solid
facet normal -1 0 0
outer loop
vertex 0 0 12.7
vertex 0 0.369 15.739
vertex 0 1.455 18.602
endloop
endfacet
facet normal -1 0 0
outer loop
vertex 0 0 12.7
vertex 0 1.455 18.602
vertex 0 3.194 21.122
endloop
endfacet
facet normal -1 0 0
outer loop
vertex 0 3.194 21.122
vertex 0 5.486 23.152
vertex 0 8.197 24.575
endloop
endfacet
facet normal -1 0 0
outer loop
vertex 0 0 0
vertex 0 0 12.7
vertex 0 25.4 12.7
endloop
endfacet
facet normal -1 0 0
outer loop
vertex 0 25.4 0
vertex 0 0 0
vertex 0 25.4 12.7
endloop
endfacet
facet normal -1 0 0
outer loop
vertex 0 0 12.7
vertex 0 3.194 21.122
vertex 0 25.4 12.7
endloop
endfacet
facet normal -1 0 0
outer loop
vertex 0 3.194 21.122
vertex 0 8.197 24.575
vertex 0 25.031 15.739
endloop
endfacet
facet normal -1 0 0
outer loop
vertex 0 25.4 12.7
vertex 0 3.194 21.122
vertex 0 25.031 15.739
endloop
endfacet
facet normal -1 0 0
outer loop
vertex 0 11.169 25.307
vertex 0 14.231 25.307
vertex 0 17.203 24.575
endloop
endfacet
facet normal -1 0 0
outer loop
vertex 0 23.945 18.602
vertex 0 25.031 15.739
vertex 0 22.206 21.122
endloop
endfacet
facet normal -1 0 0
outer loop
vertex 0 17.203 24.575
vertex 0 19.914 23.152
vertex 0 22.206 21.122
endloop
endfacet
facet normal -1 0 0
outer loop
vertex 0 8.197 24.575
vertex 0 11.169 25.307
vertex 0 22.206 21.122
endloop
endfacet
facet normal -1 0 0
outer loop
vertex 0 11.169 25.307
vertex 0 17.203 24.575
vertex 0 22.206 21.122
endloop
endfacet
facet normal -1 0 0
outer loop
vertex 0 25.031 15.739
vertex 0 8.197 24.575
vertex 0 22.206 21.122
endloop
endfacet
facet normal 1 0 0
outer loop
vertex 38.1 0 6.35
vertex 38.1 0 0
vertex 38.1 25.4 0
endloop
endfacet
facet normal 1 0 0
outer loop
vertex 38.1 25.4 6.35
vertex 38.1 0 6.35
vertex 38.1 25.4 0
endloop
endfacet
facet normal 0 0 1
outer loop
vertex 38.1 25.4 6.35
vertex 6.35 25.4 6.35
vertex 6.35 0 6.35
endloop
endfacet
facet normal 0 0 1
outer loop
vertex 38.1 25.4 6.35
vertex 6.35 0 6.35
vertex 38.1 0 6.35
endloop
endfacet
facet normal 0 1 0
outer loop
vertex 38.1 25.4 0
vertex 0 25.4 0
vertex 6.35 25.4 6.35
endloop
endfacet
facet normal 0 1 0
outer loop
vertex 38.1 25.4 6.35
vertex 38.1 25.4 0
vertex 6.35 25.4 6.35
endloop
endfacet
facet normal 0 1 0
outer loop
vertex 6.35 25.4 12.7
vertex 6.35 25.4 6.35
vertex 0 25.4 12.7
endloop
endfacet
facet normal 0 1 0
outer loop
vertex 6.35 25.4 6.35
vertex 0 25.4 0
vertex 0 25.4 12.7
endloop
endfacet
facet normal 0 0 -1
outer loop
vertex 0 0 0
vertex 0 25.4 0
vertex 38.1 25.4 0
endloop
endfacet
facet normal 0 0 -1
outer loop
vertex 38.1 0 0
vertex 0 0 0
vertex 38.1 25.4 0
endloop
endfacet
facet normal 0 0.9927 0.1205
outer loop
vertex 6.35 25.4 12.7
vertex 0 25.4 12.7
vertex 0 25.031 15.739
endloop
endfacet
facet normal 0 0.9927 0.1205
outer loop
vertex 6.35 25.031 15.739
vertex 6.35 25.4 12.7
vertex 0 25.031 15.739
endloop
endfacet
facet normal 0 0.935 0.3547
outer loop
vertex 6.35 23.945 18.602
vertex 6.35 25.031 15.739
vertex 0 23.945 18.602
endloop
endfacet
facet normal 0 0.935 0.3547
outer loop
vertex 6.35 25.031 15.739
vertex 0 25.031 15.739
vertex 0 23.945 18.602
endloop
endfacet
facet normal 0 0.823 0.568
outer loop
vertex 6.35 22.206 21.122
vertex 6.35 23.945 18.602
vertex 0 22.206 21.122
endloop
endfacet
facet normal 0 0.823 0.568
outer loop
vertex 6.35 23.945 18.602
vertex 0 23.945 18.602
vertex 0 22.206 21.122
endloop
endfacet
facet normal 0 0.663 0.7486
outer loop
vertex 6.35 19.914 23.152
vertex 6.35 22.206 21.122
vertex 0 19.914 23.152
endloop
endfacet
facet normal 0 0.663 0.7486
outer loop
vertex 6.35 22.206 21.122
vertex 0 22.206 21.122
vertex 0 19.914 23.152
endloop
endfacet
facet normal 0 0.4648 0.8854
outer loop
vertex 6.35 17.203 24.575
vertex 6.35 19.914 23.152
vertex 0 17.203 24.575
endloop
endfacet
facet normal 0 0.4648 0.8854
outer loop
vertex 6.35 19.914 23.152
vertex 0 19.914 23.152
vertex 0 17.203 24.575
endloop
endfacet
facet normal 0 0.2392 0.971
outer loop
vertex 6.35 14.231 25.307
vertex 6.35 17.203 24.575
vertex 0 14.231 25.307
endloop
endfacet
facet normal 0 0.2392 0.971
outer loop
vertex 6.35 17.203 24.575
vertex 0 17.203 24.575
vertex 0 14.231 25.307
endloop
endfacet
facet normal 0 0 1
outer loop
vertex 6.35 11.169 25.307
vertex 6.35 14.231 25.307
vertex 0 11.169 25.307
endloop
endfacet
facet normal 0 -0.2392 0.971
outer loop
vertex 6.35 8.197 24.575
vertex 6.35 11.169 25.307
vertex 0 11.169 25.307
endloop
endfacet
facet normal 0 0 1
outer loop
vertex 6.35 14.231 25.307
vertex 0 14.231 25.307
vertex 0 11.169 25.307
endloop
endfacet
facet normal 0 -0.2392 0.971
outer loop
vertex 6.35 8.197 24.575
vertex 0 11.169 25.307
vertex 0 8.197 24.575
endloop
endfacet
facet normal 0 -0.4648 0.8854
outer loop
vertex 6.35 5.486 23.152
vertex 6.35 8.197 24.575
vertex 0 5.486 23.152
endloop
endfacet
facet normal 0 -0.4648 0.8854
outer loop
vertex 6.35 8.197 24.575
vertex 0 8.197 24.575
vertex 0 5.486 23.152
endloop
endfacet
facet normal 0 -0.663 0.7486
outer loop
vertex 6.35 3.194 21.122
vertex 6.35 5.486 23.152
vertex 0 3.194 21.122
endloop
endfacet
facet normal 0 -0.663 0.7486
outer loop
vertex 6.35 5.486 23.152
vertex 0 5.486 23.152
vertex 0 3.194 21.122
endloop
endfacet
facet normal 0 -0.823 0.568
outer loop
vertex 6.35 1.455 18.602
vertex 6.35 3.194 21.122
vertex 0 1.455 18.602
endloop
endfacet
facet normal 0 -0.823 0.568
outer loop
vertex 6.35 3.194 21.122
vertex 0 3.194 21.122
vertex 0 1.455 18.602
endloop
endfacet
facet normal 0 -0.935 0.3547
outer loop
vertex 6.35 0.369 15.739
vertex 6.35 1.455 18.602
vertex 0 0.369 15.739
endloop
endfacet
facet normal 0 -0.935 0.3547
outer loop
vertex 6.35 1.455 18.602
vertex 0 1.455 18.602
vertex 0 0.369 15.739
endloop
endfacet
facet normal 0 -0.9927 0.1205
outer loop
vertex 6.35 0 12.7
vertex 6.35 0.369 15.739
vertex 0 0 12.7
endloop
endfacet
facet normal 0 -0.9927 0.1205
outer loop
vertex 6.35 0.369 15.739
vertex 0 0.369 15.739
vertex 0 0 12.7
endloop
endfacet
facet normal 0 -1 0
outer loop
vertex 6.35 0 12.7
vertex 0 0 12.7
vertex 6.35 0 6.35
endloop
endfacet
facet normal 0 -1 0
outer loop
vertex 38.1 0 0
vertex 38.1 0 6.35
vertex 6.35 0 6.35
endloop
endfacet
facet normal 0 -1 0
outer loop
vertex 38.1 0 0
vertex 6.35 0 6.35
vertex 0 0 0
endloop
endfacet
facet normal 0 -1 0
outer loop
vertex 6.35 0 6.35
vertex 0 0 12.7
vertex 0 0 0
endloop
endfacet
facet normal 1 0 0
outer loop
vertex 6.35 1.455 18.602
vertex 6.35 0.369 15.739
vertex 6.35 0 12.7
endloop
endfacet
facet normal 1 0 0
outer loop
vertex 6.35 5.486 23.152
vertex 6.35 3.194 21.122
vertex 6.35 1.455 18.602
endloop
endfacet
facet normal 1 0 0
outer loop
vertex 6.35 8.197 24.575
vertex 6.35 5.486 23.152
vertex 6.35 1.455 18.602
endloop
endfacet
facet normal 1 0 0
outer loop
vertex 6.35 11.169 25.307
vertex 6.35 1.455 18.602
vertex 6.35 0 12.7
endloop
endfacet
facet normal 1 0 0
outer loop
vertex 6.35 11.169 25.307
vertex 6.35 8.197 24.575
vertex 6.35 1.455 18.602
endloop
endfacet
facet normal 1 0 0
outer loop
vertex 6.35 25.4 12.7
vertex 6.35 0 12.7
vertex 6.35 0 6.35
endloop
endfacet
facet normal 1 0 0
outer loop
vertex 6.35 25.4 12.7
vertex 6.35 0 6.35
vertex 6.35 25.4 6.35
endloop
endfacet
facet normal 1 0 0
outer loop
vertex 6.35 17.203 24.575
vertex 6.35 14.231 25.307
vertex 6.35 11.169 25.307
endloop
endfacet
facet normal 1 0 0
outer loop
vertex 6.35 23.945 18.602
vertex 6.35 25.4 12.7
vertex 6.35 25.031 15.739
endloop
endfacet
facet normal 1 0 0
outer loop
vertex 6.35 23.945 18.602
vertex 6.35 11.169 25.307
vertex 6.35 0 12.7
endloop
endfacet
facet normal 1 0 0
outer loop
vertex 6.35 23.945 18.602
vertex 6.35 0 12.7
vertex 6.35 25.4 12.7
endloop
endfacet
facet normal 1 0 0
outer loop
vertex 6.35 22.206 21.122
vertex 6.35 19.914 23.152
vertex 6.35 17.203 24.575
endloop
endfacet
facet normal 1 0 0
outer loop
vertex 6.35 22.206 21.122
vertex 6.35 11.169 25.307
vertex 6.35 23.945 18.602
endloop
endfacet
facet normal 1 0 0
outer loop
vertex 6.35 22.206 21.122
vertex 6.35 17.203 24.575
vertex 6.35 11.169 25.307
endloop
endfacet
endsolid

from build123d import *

# Parameters (mm, degrees)
F0_W     = 38.1
F0_H     = 25.4
F1_DEPTH = 6.35
F3_DEPTH = 6.35


with BuildPart() as f1:
    # F0 (on Top) → F1 (new body)
    with BuildSketch(Plane.XY):
        with Locations((19.05, 12.7)):
            Rectangle(F0_W, F0_H)
    extrude(amount=F1_DEPTH)

    # F2 (on Right) → F3 (join)
    with BuildSketch(Plane.YZ):
        with BuildLine():
            Line((0, 12.7), (0, 6.35))
            Line((0, 6.35), (25.4, 6.35))
            Line((25.4, 6.35), (25.4, 12.7))
            ThreePointArc((25.4, 12.7), (12.7, 25.4), (0, 12.7))
        make_face()
    extrude(amount=F3_DEPTH)


solid = f1.part
